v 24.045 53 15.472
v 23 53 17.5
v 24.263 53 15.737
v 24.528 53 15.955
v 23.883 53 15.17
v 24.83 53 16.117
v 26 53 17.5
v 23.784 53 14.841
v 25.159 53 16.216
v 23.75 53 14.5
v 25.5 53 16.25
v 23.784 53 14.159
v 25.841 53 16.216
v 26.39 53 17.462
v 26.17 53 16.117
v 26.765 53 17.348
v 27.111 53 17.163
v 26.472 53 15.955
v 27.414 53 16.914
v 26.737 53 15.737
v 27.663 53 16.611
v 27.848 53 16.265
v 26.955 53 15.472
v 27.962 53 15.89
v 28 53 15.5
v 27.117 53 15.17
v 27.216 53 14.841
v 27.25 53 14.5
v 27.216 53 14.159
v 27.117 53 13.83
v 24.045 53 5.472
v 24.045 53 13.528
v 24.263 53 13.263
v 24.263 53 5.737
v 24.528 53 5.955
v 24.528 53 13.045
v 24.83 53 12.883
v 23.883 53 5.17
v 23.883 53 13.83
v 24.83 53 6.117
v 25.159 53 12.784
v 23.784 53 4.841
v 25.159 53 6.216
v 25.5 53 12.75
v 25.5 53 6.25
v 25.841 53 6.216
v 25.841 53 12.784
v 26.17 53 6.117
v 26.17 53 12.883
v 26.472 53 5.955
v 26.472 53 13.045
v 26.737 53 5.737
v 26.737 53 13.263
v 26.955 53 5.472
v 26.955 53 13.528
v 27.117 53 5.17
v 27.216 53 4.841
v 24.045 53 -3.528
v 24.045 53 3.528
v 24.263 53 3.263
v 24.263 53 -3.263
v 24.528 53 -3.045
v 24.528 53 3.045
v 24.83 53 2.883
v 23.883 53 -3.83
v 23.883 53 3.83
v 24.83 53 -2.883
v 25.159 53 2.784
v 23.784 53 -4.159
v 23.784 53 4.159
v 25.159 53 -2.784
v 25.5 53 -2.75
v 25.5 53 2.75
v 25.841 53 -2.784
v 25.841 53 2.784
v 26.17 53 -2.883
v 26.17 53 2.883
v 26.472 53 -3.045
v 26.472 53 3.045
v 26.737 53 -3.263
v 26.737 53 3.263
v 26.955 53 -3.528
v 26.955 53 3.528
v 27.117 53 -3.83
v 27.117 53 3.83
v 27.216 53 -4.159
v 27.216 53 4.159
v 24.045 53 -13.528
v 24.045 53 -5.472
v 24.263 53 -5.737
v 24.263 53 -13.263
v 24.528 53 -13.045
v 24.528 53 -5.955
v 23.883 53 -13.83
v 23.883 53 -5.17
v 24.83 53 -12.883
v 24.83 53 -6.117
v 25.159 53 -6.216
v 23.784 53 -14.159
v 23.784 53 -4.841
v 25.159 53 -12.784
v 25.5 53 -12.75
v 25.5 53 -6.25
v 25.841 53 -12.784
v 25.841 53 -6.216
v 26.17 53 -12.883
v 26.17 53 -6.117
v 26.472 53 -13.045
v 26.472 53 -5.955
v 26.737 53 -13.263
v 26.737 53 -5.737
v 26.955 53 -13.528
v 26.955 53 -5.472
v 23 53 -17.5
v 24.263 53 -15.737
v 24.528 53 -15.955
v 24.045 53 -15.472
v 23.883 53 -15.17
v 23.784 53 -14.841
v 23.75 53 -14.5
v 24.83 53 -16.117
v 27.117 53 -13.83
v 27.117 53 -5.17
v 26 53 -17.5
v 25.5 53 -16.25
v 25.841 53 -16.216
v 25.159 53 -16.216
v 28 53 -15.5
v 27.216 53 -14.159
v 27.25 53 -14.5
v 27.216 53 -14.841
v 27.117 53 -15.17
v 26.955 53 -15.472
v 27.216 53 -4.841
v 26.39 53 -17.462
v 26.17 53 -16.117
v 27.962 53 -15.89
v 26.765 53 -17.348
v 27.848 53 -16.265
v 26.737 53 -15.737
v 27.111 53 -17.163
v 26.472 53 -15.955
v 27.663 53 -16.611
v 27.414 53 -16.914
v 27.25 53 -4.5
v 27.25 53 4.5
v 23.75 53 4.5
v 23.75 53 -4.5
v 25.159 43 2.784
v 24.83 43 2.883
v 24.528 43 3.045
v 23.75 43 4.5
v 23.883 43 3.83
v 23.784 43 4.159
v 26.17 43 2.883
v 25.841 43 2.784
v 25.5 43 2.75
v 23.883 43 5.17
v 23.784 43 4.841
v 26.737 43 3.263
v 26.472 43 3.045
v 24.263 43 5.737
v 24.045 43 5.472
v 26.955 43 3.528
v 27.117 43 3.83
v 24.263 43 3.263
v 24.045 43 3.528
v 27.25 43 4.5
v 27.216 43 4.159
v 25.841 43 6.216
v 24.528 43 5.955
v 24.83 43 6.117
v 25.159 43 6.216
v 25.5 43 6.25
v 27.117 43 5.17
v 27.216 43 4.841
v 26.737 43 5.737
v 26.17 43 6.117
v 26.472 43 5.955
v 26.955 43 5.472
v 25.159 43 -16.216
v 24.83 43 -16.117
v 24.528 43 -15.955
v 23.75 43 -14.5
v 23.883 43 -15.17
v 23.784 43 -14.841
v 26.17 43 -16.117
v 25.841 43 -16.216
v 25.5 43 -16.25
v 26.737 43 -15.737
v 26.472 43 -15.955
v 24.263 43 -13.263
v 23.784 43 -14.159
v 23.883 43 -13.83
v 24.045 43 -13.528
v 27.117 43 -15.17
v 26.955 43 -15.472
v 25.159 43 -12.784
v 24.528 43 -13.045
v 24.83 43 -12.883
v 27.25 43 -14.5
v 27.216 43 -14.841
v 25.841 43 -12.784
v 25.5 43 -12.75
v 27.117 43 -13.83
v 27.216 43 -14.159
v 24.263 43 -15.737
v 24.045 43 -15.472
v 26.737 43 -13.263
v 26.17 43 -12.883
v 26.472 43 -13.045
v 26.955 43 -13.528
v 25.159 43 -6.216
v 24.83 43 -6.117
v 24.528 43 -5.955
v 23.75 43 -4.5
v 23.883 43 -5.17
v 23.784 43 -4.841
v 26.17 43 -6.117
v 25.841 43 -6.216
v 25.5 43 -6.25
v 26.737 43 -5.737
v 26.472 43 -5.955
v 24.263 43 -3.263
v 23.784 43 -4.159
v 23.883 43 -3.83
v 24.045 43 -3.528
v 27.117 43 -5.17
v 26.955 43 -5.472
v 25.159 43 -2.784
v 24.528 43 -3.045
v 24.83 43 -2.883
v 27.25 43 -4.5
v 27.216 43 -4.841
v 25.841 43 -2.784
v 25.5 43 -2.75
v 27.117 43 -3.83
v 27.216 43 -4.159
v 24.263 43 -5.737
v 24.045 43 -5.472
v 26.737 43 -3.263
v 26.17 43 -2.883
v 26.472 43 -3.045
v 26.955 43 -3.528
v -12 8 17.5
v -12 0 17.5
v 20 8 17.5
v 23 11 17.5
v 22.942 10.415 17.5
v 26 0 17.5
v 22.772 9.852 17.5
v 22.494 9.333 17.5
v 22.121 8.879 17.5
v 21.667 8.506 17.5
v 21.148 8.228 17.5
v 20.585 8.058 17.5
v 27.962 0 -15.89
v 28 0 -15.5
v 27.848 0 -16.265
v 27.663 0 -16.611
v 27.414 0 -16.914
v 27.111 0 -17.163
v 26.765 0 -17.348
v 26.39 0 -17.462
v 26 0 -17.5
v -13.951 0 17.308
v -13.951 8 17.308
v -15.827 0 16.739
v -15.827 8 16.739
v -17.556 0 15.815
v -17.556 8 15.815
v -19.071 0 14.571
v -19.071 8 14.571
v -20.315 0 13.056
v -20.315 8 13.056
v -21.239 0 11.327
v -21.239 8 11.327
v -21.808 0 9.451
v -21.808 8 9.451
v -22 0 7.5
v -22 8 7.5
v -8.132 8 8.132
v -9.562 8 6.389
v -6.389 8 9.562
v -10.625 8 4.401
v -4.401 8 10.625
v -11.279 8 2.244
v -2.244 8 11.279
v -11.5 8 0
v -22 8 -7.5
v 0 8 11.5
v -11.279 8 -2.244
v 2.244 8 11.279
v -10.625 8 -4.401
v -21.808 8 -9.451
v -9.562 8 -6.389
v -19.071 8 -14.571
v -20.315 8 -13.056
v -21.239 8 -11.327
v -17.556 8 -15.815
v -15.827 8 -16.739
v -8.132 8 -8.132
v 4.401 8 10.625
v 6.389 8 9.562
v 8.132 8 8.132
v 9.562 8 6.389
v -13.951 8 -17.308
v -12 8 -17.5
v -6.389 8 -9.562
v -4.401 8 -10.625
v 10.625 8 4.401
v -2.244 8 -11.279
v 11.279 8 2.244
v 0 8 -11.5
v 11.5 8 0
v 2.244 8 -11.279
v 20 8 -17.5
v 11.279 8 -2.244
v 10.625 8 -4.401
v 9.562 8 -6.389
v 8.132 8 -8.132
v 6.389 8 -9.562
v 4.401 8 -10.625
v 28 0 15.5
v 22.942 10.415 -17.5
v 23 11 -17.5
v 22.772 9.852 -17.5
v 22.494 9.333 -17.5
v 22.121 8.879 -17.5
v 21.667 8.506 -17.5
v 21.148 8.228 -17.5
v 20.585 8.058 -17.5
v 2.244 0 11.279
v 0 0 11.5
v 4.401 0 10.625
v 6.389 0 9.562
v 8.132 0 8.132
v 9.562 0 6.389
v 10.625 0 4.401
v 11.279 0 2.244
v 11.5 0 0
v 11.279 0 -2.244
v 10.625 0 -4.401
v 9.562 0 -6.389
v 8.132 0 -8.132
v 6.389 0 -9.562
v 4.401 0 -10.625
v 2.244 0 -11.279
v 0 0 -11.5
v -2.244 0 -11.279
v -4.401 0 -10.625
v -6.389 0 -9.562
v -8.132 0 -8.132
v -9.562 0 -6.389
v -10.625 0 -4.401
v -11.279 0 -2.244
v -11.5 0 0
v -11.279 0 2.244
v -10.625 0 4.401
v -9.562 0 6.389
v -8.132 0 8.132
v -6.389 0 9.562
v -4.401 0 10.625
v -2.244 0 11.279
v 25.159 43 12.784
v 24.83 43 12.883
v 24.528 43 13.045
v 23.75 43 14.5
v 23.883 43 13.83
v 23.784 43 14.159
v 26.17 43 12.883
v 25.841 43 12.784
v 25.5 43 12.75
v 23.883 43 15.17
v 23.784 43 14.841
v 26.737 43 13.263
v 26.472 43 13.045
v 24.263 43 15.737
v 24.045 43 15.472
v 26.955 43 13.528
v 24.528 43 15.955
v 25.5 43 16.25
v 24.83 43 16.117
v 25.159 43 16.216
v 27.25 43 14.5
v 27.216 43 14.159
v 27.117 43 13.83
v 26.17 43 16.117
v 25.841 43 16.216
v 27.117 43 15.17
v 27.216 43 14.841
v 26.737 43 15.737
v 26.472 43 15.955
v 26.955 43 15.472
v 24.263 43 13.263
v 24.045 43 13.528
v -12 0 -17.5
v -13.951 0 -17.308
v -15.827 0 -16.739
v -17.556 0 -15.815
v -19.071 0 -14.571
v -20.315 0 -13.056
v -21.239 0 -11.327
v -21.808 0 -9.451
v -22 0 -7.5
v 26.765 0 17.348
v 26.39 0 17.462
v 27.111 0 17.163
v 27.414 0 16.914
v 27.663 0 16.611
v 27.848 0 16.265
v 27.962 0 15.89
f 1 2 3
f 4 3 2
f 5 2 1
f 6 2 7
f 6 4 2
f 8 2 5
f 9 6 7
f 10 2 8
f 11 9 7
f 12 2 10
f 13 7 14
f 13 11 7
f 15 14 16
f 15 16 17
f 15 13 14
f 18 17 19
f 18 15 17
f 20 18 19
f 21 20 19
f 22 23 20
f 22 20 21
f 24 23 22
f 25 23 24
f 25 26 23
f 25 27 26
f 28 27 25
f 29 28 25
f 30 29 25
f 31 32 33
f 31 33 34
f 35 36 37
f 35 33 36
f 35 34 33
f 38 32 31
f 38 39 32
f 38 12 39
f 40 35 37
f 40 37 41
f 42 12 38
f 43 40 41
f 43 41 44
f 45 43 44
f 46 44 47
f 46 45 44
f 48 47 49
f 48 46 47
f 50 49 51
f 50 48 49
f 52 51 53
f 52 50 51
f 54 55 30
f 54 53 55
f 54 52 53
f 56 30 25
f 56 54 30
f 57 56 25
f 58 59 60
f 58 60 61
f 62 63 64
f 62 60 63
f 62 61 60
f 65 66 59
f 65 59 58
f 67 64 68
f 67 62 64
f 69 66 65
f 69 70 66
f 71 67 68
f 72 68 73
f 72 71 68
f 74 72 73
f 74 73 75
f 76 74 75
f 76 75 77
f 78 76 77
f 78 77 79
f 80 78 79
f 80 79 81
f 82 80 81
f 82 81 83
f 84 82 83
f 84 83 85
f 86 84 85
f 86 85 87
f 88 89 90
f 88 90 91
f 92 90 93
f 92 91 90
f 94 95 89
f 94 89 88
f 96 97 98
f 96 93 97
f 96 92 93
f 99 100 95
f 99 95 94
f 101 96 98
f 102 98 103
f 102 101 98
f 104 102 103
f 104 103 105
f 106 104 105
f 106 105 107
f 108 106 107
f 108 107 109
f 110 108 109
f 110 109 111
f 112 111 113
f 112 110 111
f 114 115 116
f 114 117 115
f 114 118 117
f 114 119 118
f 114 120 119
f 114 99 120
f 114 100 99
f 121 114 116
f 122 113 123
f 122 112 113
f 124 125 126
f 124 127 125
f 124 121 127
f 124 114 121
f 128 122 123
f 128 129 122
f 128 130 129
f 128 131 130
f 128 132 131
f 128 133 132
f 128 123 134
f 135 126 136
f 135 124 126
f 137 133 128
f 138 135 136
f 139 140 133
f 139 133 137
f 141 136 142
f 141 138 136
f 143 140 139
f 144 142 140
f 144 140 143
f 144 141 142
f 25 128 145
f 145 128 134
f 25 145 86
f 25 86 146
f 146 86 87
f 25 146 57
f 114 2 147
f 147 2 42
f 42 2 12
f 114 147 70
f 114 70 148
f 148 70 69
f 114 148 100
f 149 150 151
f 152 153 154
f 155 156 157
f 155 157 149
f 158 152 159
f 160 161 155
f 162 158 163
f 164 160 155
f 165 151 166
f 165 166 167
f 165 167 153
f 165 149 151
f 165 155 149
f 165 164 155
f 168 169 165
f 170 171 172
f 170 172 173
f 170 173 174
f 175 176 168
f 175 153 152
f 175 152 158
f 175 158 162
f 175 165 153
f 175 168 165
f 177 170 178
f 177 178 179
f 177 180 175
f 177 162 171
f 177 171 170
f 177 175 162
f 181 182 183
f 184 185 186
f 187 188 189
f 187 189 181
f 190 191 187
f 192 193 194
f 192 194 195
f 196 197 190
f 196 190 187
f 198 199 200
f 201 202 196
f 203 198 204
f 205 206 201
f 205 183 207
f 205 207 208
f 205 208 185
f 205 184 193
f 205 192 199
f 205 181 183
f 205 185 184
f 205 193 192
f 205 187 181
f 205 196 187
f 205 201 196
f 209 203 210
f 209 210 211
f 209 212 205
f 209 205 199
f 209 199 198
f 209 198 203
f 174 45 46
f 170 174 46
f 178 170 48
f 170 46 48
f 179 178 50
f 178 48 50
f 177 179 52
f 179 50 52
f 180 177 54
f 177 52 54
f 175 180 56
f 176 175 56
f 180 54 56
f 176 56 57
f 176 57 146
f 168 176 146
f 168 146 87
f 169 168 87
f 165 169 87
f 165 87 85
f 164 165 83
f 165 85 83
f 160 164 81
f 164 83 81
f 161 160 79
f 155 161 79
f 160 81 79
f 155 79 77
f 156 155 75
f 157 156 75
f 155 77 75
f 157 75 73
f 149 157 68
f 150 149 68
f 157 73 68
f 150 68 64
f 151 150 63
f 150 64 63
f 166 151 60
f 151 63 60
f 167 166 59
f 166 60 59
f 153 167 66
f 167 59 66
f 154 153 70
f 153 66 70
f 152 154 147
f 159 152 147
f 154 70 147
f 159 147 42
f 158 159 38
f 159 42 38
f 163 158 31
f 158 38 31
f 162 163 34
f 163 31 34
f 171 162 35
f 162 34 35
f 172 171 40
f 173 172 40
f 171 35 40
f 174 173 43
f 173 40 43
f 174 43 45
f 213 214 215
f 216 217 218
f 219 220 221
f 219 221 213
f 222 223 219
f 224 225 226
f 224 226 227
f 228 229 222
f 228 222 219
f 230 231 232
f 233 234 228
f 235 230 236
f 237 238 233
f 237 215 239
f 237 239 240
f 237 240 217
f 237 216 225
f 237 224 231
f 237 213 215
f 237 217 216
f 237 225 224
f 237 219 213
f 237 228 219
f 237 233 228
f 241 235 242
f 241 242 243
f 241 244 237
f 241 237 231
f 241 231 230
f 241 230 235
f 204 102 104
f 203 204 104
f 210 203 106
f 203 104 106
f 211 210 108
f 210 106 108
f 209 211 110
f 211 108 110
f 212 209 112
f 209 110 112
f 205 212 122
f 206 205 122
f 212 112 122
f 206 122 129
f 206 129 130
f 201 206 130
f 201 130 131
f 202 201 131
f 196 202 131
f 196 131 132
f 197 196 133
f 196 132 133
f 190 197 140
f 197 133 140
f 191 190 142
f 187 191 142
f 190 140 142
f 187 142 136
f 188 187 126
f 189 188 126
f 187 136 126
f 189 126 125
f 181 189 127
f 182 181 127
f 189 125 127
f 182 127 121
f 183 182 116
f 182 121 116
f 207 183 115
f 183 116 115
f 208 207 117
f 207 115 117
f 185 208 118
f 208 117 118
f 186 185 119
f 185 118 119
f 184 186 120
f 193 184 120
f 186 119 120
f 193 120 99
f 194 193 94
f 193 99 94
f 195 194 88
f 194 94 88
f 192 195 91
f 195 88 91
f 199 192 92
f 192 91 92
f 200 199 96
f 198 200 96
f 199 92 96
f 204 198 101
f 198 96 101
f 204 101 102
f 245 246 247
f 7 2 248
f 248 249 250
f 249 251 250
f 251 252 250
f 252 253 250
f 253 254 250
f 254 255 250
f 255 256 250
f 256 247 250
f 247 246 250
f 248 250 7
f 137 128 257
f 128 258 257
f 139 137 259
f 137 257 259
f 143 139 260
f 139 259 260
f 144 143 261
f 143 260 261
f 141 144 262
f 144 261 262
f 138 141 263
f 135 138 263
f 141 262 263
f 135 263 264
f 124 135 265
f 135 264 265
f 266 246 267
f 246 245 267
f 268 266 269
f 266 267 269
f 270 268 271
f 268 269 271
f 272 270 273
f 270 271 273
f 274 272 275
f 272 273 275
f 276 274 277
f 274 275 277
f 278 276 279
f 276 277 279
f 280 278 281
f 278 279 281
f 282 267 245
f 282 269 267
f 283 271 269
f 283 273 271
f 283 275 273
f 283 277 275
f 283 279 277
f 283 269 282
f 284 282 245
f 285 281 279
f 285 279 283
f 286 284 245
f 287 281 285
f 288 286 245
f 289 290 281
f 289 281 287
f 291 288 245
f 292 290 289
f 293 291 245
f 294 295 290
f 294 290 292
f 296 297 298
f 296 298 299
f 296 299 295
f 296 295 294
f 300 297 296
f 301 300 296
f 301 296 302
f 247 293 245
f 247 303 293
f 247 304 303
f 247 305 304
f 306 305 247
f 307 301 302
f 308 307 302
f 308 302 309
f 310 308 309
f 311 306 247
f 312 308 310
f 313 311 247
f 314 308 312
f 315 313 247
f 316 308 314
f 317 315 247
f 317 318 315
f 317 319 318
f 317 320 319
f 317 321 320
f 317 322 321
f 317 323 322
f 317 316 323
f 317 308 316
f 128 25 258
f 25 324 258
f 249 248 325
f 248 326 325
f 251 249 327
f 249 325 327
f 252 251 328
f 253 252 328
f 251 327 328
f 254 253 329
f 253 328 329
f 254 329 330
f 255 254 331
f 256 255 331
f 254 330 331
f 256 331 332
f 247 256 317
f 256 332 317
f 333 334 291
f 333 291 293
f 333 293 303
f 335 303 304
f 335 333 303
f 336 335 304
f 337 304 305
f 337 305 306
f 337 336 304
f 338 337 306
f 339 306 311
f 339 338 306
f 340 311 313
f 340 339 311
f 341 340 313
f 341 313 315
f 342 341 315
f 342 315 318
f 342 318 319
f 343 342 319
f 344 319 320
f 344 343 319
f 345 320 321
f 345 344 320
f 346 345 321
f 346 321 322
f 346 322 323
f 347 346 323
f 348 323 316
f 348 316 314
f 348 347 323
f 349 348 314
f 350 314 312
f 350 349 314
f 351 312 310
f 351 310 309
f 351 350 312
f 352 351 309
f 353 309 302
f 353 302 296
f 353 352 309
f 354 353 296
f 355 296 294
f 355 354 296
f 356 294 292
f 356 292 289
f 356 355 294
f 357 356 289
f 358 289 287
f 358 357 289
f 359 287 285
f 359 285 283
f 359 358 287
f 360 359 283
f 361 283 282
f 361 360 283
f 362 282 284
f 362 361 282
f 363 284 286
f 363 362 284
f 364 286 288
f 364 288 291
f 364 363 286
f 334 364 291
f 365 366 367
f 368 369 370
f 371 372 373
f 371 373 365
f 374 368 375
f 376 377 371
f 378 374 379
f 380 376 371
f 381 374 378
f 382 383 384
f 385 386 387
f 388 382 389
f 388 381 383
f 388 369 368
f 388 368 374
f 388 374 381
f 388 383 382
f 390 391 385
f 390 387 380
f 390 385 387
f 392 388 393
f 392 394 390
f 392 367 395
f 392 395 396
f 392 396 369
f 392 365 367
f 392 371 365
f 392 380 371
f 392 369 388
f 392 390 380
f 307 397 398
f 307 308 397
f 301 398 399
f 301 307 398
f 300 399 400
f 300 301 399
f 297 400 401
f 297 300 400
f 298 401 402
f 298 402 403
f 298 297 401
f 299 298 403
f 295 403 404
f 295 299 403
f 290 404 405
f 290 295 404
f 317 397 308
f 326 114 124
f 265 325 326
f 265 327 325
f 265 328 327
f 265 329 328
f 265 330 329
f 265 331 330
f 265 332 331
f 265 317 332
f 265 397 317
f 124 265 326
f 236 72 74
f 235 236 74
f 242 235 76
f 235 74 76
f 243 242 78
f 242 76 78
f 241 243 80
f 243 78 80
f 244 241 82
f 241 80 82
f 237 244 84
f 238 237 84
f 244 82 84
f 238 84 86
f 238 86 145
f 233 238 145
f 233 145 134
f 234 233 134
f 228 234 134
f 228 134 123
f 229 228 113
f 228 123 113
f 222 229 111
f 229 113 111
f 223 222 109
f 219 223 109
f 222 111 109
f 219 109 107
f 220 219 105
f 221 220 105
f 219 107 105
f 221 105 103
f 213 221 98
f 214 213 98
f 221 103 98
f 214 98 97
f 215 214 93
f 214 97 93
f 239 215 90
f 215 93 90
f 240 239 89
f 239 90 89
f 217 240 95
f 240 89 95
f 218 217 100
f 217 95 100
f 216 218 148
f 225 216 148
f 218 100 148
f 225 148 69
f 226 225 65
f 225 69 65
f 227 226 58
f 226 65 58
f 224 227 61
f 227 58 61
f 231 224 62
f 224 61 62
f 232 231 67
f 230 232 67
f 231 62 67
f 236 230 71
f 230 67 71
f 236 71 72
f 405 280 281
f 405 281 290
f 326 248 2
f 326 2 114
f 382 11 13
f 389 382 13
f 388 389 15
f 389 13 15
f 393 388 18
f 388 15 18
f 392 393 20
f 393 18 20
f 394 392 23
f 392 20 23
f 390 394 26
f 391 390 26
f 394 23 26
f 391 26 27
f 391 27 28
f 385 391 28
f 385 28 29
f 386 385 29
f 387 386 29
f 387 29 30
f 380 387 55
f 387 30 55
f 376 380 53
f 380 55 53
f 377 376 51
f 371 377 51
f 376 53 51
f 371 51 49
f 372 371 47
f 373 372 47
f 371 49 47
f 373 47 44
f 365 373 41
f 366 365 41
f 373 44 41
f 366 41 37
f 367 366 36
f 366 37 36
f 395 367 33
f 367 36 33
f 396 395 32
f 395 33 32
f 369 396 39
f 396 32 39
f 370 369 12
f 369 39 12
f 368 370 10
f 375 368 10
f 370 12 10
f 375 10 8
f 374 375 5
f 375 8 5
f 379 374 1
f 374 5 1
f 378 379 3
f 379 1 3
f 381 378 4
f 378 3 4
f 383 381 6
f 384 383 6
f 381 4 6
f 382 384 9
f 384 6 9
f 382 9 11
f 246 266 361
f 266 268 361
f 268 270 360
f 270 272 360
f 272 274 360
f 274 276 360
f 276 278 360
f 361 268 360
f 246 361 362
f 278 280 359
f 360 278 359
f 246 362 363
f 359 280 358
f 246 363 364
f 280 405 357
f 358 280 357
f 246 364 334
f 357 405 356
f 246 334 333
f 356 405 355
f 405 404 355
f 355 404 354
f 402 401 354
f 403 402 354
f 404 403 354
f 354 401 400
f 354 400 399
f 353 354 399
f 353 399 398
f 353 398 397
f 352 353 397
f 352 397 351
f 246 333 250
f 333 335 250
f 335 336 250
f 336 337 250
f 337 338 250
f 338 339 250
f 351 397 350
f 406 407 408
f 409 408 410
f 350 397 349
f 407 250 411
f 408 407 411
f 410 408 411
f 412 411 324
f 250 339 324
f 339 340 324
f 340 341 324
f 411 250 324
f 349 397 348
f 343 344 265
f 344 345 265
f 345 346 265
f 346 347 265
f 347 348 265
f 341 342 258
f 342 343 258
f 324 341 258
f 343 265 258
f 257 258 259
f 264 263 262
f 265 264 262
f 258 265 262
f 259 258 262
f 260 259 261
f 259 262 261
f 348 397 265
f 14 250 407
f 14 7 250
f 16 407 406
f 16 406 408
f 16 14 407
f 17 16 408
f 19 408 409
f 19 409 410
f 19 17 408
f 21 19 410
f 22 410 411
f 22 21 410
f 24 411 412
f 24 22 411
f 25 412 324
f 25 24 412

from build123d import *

# Parameters (mm, degrees)
SKETCH1_W           = 50
SKETCH1_H           = 35
SKETCH1_R           = 11.5
BOSS_EXTRUDE1_DEPTH = 8
SKETCH2_W           = 5
SKETCH2_H           = 35
BOSS_EXTRUDE2_DEPTH = 45
FILLET2_R           = 3
SKETCH5_R           = 1.75
CUT_EXTRUDE2_DEPTH  = 10
FILLET3_R           = 10
FILLET4_R           = 2


with BuildPart() as part:
    # Sketch1 → Boss-Extrude1 (new body)
    with BuildSketch(Plane(origin=(0, 0, 0), x_dir=(1, 0, 0), z_dir=(0, 1, 0))):
        with Locations((3, 0)):
            Rectangle(SKETCH1_W, SKETCH1_H)
        with Locations(Location((0, 0, 0), (0, 0, 270))):
            Circle(SKETCH1_R, mode=Mode.SUBTRACT)
    extrude(amount=BOSS_EXTRUDE1_DEPTH)

    # Sketch2 → Boss-Extrude2 (add)
    with BuildSketch(Plane(origin=(0, 8, 0), x_dir=(1, 0, 0), z_dir=(0, 1, 0))):
        with Locations((25.5, 0)):
            Rectangle(SKETCH2_W, SKETCH2_H)
    extrude(amount=BOSS_EXTRUDE2_DEPTH)

    # Fillet2
    fillet2_edges = [part.edges().sort_by_distance(p)[0] for p in [
        (23, 8, 0),
    ]]
    fillet(fillet2_edges, radius=FILLET2_R)

    # Sketch5 → Cut-Extrude2 (cut)
    with BuildSketch(Plane(origin=(0, 53, 0), x_dir=(1, 0, 0), z_dir=(0, 1, 0))):
        with Locations(Location((25.5, 14.5, 0), (0, 0, 270))):
            Circle(SKETCH5_R)
        with Locations(Location((25.5, -14.5, 0), (0, 0, 270))):
            Circle(SKETCH5_R)
        with Locations(Location((25.5, 4.5, 0), (0, 0, 270))):
            Circle(SKETCH5_R)
        with Locations(Location((25.5, -4.5, 0), (0, 0, 270))):
            Circle(SKETCH5_R)
    extrude(amount=-CUT_EXTRUDE2_DEPTH, mode=Mode.SUBTRACT)

    # Fillet3
    fillet3_edges = [part.edges().sort_by_distance(p)[0] for p in [
        (-22, 4, 17.5),
        (-22, 4, -17.5),
    ]]
    fillet(fillet3_edges, radius=FILLET3_R)

    # Fillet4
    fillet4_edges = [part.edges().sort_by_distance(p)[0] for p in [
        (28, 26.5, 17.5),
        (28, 26.5, -17.5),
    ]]
    fillet(fillet4_edges, radius=FILLET4_R)


solid = part.part
